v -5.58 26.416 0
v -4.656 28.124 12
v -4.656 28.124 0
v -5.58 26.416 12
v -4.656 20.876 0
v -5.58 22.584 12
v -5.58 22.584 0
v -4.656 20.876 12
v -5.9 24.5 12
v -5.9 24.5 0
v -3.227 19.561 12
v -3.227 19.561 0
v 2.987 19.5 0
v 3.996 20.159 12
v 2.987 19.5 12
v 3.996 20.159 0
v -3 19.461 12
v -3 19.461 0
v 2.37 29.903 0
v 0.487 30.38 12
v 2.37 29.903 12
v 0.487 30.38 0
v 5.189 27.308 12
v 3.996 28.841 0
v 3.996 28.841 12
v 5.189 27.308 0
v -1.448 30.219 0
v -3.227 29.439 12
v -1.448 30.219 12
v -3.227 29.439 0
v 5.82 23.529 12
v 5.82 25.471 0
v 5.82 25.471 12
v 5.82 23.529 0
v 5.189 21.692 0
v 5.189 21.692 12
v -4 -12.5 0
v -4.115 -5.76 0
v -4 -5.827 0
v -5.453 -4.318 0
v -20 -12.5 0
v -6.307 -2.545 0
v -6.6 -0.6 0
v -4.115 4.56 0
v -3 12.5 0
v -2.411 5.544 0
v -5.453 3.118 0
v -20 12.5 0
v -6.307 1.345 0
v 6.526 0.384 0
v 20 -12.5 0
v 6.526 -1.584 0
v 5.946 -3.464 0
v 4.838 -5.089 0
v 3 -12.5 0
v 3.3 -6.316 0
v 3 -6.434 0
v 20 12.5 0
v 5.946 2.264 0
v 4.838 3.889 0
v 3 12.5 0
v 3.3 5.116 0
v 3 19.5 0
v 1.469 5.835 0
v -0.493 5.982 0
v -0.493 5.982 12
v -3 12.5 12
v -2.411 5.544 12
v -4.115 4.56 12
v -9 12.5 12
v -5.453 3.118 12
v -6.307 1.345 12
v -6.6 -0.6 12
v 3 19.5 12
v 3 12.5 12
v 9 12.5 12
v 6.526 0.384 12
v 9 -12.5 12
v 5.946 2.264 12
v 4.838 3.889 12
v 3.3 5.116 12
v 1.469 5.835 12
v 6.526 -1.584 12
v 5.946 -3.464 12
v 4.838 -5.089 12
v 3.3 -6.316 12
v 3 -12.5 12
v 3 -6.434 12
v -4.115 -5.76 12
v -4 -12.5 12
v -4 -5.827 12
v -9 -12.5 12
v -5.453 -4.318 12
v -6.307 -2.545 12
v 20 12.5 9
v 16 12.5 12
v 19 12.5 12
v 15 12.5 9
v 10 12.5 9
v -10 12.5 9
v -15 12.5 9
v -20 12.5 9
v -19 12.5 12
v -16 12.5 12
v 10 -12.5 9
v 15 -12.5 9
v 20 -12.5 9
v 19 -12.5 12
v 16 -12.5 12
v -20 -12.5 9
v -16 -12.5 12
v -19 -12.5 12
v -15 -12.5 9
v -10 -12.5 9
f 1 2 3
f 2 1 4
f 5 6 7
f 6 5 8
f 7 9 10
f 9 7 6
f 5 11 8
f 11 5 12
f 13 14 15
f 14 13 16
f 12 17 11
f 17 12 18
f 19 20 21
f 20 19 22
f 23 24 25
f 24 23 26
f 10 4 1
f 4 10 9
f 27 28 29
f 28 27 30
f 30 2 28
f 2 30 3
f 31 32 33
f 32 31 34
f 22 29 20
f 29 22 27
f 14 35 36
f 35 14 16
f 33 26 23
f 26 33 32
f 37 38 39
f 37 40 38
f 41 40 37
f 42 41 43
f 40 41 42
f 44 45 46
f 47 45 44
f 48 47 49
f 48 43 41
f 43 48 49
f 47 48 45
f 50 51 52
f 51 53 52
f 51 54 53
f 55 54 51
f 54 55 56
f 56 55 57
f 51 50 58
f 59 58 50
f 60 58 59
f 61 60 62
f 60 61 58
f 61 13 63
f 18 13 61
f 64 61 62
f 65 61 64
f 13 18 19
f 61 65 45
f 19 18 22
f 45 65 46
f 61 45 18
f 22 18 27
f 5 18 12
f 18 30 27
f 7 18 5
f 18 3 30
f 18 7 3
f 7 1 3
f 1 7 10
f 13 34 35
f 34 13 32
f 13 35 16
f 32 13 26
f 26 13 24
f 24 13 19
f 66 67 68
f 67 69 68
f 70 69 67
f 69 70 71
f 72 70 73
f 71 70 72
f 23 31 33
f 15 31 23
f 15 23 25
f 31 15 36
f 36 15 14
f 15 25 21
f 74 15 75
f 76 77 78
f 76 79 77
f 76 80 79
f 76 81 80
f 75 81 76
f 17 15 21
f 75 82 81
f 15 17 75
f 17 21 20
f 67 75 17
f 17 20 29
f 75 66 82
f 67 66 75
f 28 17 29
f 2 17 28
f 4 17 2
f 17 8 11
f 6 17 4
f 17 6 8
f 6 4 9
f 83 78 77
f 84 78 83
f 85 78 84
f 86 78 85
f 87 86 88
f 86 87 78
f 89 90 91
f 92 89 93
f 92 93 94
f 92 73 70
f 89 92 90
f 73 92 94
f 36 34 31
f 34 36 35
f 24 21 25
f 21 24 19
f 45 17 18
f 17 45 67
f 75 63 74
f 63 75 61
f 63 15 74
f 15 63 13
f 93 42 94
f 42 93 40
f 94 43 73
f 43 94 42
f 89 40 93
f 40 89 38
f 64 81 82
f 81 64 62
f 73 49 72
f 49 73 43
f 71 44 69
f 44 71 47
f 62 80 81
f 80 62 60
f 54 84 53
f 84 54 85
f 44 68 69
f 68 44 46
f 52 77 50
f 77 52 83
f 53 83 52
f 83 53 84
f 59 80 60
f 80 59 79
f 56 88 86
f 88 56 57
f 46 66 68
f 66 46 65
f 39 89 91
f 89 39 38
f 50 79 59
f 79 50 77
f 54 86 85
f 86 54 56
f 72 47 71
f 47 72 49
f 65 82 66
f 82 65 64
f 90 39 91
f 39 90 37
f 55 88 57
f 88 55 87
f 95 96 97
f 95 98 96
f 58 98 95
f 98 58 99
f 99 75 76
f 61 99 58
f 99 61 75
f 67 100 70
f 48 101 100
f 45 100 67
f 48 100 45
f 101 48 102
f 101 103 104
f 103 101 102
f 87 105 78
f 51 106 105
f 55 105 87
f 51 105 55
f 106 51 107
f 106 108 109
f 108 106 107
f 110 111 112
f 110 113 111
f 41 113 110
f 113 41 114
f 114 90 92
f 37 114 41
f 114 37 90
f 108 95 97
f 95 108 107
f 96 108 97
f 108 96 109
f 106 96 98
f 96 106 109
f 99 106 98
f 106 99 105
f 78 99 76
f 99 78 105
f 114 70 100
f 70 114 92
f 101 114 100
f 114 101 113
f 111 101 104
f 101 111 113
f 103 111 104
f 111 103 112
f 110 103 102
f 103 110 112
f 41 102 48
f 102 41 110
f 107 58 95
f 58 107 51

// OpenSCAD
// [FL_INDEX: keywords="openscad, 3d_parametric, Toy_train_track__customizer, csg_solid" | COT="Parametric OpenSCAD design from 3DCodeverse"]
// Title: Toy train track (customizer)

//in mm. Minimum 40 for female-female
track_length=25;
track_option=2; // [1:male-male, 2:male-female, 3: female-female]

//track extrusion
module track(){
	translate([-20,0,0])
	rotate (a=[90,0,0]) linear_extrude(height =track_length, center = true) polygon(points = [ [0,0], [0,9], [1,12],[4,12],[5,9],[10,9],[11,12],[29,12],[30,9],[35,9],[36,12], [39,12],[40,9], [40,0]], path = [[0,1,2,3,4,5,6,7,8,9,10,11,12,13,14]]);
}

//peg male
module peg(){
	translate ([0,-12,0])
	union(){
		cylinder(12,5.9,5.9);
		translate ([-3,5,0]) cube(size=[6,8,12]);
	}
}

//peg cut female
module peg_cut(){
	translate ([0,-11.9,-1])
	union(){
		cylinder(14,6.6,6.6);
		translate ([-3,5,0]) cube(size=[7,8,14]);
	}
}

//male-male track
module mm_track (){
translate ([0,-track_length/2,0]) peg();
translate ([0,track_length/2,0]) rotate(a=[0,0,180]) peg();
track ();
}

//male-female track
module mf_track (){
	translate ([0,track_length/2,0]) rotate(a=[0,0,180]) peg();
	difference() {
		track();
		translate ([0,-track_length/2,0]) rotate(a=[0,0,180]) peg_cut();	
	}
}

//female-female track
module ff_track (){
	difference() {
		track();
		translate ([0,-track_length/2,0]) rotate(a=[0,0,180]) peg_cut();
		translate ([0,track_length/2,0])  peg_cut();	
	}
}
if (track_option==1) {
	mm_track();
}
if (track_option==2) {
	mf_track();
}
else
{
	ff_track();
}
